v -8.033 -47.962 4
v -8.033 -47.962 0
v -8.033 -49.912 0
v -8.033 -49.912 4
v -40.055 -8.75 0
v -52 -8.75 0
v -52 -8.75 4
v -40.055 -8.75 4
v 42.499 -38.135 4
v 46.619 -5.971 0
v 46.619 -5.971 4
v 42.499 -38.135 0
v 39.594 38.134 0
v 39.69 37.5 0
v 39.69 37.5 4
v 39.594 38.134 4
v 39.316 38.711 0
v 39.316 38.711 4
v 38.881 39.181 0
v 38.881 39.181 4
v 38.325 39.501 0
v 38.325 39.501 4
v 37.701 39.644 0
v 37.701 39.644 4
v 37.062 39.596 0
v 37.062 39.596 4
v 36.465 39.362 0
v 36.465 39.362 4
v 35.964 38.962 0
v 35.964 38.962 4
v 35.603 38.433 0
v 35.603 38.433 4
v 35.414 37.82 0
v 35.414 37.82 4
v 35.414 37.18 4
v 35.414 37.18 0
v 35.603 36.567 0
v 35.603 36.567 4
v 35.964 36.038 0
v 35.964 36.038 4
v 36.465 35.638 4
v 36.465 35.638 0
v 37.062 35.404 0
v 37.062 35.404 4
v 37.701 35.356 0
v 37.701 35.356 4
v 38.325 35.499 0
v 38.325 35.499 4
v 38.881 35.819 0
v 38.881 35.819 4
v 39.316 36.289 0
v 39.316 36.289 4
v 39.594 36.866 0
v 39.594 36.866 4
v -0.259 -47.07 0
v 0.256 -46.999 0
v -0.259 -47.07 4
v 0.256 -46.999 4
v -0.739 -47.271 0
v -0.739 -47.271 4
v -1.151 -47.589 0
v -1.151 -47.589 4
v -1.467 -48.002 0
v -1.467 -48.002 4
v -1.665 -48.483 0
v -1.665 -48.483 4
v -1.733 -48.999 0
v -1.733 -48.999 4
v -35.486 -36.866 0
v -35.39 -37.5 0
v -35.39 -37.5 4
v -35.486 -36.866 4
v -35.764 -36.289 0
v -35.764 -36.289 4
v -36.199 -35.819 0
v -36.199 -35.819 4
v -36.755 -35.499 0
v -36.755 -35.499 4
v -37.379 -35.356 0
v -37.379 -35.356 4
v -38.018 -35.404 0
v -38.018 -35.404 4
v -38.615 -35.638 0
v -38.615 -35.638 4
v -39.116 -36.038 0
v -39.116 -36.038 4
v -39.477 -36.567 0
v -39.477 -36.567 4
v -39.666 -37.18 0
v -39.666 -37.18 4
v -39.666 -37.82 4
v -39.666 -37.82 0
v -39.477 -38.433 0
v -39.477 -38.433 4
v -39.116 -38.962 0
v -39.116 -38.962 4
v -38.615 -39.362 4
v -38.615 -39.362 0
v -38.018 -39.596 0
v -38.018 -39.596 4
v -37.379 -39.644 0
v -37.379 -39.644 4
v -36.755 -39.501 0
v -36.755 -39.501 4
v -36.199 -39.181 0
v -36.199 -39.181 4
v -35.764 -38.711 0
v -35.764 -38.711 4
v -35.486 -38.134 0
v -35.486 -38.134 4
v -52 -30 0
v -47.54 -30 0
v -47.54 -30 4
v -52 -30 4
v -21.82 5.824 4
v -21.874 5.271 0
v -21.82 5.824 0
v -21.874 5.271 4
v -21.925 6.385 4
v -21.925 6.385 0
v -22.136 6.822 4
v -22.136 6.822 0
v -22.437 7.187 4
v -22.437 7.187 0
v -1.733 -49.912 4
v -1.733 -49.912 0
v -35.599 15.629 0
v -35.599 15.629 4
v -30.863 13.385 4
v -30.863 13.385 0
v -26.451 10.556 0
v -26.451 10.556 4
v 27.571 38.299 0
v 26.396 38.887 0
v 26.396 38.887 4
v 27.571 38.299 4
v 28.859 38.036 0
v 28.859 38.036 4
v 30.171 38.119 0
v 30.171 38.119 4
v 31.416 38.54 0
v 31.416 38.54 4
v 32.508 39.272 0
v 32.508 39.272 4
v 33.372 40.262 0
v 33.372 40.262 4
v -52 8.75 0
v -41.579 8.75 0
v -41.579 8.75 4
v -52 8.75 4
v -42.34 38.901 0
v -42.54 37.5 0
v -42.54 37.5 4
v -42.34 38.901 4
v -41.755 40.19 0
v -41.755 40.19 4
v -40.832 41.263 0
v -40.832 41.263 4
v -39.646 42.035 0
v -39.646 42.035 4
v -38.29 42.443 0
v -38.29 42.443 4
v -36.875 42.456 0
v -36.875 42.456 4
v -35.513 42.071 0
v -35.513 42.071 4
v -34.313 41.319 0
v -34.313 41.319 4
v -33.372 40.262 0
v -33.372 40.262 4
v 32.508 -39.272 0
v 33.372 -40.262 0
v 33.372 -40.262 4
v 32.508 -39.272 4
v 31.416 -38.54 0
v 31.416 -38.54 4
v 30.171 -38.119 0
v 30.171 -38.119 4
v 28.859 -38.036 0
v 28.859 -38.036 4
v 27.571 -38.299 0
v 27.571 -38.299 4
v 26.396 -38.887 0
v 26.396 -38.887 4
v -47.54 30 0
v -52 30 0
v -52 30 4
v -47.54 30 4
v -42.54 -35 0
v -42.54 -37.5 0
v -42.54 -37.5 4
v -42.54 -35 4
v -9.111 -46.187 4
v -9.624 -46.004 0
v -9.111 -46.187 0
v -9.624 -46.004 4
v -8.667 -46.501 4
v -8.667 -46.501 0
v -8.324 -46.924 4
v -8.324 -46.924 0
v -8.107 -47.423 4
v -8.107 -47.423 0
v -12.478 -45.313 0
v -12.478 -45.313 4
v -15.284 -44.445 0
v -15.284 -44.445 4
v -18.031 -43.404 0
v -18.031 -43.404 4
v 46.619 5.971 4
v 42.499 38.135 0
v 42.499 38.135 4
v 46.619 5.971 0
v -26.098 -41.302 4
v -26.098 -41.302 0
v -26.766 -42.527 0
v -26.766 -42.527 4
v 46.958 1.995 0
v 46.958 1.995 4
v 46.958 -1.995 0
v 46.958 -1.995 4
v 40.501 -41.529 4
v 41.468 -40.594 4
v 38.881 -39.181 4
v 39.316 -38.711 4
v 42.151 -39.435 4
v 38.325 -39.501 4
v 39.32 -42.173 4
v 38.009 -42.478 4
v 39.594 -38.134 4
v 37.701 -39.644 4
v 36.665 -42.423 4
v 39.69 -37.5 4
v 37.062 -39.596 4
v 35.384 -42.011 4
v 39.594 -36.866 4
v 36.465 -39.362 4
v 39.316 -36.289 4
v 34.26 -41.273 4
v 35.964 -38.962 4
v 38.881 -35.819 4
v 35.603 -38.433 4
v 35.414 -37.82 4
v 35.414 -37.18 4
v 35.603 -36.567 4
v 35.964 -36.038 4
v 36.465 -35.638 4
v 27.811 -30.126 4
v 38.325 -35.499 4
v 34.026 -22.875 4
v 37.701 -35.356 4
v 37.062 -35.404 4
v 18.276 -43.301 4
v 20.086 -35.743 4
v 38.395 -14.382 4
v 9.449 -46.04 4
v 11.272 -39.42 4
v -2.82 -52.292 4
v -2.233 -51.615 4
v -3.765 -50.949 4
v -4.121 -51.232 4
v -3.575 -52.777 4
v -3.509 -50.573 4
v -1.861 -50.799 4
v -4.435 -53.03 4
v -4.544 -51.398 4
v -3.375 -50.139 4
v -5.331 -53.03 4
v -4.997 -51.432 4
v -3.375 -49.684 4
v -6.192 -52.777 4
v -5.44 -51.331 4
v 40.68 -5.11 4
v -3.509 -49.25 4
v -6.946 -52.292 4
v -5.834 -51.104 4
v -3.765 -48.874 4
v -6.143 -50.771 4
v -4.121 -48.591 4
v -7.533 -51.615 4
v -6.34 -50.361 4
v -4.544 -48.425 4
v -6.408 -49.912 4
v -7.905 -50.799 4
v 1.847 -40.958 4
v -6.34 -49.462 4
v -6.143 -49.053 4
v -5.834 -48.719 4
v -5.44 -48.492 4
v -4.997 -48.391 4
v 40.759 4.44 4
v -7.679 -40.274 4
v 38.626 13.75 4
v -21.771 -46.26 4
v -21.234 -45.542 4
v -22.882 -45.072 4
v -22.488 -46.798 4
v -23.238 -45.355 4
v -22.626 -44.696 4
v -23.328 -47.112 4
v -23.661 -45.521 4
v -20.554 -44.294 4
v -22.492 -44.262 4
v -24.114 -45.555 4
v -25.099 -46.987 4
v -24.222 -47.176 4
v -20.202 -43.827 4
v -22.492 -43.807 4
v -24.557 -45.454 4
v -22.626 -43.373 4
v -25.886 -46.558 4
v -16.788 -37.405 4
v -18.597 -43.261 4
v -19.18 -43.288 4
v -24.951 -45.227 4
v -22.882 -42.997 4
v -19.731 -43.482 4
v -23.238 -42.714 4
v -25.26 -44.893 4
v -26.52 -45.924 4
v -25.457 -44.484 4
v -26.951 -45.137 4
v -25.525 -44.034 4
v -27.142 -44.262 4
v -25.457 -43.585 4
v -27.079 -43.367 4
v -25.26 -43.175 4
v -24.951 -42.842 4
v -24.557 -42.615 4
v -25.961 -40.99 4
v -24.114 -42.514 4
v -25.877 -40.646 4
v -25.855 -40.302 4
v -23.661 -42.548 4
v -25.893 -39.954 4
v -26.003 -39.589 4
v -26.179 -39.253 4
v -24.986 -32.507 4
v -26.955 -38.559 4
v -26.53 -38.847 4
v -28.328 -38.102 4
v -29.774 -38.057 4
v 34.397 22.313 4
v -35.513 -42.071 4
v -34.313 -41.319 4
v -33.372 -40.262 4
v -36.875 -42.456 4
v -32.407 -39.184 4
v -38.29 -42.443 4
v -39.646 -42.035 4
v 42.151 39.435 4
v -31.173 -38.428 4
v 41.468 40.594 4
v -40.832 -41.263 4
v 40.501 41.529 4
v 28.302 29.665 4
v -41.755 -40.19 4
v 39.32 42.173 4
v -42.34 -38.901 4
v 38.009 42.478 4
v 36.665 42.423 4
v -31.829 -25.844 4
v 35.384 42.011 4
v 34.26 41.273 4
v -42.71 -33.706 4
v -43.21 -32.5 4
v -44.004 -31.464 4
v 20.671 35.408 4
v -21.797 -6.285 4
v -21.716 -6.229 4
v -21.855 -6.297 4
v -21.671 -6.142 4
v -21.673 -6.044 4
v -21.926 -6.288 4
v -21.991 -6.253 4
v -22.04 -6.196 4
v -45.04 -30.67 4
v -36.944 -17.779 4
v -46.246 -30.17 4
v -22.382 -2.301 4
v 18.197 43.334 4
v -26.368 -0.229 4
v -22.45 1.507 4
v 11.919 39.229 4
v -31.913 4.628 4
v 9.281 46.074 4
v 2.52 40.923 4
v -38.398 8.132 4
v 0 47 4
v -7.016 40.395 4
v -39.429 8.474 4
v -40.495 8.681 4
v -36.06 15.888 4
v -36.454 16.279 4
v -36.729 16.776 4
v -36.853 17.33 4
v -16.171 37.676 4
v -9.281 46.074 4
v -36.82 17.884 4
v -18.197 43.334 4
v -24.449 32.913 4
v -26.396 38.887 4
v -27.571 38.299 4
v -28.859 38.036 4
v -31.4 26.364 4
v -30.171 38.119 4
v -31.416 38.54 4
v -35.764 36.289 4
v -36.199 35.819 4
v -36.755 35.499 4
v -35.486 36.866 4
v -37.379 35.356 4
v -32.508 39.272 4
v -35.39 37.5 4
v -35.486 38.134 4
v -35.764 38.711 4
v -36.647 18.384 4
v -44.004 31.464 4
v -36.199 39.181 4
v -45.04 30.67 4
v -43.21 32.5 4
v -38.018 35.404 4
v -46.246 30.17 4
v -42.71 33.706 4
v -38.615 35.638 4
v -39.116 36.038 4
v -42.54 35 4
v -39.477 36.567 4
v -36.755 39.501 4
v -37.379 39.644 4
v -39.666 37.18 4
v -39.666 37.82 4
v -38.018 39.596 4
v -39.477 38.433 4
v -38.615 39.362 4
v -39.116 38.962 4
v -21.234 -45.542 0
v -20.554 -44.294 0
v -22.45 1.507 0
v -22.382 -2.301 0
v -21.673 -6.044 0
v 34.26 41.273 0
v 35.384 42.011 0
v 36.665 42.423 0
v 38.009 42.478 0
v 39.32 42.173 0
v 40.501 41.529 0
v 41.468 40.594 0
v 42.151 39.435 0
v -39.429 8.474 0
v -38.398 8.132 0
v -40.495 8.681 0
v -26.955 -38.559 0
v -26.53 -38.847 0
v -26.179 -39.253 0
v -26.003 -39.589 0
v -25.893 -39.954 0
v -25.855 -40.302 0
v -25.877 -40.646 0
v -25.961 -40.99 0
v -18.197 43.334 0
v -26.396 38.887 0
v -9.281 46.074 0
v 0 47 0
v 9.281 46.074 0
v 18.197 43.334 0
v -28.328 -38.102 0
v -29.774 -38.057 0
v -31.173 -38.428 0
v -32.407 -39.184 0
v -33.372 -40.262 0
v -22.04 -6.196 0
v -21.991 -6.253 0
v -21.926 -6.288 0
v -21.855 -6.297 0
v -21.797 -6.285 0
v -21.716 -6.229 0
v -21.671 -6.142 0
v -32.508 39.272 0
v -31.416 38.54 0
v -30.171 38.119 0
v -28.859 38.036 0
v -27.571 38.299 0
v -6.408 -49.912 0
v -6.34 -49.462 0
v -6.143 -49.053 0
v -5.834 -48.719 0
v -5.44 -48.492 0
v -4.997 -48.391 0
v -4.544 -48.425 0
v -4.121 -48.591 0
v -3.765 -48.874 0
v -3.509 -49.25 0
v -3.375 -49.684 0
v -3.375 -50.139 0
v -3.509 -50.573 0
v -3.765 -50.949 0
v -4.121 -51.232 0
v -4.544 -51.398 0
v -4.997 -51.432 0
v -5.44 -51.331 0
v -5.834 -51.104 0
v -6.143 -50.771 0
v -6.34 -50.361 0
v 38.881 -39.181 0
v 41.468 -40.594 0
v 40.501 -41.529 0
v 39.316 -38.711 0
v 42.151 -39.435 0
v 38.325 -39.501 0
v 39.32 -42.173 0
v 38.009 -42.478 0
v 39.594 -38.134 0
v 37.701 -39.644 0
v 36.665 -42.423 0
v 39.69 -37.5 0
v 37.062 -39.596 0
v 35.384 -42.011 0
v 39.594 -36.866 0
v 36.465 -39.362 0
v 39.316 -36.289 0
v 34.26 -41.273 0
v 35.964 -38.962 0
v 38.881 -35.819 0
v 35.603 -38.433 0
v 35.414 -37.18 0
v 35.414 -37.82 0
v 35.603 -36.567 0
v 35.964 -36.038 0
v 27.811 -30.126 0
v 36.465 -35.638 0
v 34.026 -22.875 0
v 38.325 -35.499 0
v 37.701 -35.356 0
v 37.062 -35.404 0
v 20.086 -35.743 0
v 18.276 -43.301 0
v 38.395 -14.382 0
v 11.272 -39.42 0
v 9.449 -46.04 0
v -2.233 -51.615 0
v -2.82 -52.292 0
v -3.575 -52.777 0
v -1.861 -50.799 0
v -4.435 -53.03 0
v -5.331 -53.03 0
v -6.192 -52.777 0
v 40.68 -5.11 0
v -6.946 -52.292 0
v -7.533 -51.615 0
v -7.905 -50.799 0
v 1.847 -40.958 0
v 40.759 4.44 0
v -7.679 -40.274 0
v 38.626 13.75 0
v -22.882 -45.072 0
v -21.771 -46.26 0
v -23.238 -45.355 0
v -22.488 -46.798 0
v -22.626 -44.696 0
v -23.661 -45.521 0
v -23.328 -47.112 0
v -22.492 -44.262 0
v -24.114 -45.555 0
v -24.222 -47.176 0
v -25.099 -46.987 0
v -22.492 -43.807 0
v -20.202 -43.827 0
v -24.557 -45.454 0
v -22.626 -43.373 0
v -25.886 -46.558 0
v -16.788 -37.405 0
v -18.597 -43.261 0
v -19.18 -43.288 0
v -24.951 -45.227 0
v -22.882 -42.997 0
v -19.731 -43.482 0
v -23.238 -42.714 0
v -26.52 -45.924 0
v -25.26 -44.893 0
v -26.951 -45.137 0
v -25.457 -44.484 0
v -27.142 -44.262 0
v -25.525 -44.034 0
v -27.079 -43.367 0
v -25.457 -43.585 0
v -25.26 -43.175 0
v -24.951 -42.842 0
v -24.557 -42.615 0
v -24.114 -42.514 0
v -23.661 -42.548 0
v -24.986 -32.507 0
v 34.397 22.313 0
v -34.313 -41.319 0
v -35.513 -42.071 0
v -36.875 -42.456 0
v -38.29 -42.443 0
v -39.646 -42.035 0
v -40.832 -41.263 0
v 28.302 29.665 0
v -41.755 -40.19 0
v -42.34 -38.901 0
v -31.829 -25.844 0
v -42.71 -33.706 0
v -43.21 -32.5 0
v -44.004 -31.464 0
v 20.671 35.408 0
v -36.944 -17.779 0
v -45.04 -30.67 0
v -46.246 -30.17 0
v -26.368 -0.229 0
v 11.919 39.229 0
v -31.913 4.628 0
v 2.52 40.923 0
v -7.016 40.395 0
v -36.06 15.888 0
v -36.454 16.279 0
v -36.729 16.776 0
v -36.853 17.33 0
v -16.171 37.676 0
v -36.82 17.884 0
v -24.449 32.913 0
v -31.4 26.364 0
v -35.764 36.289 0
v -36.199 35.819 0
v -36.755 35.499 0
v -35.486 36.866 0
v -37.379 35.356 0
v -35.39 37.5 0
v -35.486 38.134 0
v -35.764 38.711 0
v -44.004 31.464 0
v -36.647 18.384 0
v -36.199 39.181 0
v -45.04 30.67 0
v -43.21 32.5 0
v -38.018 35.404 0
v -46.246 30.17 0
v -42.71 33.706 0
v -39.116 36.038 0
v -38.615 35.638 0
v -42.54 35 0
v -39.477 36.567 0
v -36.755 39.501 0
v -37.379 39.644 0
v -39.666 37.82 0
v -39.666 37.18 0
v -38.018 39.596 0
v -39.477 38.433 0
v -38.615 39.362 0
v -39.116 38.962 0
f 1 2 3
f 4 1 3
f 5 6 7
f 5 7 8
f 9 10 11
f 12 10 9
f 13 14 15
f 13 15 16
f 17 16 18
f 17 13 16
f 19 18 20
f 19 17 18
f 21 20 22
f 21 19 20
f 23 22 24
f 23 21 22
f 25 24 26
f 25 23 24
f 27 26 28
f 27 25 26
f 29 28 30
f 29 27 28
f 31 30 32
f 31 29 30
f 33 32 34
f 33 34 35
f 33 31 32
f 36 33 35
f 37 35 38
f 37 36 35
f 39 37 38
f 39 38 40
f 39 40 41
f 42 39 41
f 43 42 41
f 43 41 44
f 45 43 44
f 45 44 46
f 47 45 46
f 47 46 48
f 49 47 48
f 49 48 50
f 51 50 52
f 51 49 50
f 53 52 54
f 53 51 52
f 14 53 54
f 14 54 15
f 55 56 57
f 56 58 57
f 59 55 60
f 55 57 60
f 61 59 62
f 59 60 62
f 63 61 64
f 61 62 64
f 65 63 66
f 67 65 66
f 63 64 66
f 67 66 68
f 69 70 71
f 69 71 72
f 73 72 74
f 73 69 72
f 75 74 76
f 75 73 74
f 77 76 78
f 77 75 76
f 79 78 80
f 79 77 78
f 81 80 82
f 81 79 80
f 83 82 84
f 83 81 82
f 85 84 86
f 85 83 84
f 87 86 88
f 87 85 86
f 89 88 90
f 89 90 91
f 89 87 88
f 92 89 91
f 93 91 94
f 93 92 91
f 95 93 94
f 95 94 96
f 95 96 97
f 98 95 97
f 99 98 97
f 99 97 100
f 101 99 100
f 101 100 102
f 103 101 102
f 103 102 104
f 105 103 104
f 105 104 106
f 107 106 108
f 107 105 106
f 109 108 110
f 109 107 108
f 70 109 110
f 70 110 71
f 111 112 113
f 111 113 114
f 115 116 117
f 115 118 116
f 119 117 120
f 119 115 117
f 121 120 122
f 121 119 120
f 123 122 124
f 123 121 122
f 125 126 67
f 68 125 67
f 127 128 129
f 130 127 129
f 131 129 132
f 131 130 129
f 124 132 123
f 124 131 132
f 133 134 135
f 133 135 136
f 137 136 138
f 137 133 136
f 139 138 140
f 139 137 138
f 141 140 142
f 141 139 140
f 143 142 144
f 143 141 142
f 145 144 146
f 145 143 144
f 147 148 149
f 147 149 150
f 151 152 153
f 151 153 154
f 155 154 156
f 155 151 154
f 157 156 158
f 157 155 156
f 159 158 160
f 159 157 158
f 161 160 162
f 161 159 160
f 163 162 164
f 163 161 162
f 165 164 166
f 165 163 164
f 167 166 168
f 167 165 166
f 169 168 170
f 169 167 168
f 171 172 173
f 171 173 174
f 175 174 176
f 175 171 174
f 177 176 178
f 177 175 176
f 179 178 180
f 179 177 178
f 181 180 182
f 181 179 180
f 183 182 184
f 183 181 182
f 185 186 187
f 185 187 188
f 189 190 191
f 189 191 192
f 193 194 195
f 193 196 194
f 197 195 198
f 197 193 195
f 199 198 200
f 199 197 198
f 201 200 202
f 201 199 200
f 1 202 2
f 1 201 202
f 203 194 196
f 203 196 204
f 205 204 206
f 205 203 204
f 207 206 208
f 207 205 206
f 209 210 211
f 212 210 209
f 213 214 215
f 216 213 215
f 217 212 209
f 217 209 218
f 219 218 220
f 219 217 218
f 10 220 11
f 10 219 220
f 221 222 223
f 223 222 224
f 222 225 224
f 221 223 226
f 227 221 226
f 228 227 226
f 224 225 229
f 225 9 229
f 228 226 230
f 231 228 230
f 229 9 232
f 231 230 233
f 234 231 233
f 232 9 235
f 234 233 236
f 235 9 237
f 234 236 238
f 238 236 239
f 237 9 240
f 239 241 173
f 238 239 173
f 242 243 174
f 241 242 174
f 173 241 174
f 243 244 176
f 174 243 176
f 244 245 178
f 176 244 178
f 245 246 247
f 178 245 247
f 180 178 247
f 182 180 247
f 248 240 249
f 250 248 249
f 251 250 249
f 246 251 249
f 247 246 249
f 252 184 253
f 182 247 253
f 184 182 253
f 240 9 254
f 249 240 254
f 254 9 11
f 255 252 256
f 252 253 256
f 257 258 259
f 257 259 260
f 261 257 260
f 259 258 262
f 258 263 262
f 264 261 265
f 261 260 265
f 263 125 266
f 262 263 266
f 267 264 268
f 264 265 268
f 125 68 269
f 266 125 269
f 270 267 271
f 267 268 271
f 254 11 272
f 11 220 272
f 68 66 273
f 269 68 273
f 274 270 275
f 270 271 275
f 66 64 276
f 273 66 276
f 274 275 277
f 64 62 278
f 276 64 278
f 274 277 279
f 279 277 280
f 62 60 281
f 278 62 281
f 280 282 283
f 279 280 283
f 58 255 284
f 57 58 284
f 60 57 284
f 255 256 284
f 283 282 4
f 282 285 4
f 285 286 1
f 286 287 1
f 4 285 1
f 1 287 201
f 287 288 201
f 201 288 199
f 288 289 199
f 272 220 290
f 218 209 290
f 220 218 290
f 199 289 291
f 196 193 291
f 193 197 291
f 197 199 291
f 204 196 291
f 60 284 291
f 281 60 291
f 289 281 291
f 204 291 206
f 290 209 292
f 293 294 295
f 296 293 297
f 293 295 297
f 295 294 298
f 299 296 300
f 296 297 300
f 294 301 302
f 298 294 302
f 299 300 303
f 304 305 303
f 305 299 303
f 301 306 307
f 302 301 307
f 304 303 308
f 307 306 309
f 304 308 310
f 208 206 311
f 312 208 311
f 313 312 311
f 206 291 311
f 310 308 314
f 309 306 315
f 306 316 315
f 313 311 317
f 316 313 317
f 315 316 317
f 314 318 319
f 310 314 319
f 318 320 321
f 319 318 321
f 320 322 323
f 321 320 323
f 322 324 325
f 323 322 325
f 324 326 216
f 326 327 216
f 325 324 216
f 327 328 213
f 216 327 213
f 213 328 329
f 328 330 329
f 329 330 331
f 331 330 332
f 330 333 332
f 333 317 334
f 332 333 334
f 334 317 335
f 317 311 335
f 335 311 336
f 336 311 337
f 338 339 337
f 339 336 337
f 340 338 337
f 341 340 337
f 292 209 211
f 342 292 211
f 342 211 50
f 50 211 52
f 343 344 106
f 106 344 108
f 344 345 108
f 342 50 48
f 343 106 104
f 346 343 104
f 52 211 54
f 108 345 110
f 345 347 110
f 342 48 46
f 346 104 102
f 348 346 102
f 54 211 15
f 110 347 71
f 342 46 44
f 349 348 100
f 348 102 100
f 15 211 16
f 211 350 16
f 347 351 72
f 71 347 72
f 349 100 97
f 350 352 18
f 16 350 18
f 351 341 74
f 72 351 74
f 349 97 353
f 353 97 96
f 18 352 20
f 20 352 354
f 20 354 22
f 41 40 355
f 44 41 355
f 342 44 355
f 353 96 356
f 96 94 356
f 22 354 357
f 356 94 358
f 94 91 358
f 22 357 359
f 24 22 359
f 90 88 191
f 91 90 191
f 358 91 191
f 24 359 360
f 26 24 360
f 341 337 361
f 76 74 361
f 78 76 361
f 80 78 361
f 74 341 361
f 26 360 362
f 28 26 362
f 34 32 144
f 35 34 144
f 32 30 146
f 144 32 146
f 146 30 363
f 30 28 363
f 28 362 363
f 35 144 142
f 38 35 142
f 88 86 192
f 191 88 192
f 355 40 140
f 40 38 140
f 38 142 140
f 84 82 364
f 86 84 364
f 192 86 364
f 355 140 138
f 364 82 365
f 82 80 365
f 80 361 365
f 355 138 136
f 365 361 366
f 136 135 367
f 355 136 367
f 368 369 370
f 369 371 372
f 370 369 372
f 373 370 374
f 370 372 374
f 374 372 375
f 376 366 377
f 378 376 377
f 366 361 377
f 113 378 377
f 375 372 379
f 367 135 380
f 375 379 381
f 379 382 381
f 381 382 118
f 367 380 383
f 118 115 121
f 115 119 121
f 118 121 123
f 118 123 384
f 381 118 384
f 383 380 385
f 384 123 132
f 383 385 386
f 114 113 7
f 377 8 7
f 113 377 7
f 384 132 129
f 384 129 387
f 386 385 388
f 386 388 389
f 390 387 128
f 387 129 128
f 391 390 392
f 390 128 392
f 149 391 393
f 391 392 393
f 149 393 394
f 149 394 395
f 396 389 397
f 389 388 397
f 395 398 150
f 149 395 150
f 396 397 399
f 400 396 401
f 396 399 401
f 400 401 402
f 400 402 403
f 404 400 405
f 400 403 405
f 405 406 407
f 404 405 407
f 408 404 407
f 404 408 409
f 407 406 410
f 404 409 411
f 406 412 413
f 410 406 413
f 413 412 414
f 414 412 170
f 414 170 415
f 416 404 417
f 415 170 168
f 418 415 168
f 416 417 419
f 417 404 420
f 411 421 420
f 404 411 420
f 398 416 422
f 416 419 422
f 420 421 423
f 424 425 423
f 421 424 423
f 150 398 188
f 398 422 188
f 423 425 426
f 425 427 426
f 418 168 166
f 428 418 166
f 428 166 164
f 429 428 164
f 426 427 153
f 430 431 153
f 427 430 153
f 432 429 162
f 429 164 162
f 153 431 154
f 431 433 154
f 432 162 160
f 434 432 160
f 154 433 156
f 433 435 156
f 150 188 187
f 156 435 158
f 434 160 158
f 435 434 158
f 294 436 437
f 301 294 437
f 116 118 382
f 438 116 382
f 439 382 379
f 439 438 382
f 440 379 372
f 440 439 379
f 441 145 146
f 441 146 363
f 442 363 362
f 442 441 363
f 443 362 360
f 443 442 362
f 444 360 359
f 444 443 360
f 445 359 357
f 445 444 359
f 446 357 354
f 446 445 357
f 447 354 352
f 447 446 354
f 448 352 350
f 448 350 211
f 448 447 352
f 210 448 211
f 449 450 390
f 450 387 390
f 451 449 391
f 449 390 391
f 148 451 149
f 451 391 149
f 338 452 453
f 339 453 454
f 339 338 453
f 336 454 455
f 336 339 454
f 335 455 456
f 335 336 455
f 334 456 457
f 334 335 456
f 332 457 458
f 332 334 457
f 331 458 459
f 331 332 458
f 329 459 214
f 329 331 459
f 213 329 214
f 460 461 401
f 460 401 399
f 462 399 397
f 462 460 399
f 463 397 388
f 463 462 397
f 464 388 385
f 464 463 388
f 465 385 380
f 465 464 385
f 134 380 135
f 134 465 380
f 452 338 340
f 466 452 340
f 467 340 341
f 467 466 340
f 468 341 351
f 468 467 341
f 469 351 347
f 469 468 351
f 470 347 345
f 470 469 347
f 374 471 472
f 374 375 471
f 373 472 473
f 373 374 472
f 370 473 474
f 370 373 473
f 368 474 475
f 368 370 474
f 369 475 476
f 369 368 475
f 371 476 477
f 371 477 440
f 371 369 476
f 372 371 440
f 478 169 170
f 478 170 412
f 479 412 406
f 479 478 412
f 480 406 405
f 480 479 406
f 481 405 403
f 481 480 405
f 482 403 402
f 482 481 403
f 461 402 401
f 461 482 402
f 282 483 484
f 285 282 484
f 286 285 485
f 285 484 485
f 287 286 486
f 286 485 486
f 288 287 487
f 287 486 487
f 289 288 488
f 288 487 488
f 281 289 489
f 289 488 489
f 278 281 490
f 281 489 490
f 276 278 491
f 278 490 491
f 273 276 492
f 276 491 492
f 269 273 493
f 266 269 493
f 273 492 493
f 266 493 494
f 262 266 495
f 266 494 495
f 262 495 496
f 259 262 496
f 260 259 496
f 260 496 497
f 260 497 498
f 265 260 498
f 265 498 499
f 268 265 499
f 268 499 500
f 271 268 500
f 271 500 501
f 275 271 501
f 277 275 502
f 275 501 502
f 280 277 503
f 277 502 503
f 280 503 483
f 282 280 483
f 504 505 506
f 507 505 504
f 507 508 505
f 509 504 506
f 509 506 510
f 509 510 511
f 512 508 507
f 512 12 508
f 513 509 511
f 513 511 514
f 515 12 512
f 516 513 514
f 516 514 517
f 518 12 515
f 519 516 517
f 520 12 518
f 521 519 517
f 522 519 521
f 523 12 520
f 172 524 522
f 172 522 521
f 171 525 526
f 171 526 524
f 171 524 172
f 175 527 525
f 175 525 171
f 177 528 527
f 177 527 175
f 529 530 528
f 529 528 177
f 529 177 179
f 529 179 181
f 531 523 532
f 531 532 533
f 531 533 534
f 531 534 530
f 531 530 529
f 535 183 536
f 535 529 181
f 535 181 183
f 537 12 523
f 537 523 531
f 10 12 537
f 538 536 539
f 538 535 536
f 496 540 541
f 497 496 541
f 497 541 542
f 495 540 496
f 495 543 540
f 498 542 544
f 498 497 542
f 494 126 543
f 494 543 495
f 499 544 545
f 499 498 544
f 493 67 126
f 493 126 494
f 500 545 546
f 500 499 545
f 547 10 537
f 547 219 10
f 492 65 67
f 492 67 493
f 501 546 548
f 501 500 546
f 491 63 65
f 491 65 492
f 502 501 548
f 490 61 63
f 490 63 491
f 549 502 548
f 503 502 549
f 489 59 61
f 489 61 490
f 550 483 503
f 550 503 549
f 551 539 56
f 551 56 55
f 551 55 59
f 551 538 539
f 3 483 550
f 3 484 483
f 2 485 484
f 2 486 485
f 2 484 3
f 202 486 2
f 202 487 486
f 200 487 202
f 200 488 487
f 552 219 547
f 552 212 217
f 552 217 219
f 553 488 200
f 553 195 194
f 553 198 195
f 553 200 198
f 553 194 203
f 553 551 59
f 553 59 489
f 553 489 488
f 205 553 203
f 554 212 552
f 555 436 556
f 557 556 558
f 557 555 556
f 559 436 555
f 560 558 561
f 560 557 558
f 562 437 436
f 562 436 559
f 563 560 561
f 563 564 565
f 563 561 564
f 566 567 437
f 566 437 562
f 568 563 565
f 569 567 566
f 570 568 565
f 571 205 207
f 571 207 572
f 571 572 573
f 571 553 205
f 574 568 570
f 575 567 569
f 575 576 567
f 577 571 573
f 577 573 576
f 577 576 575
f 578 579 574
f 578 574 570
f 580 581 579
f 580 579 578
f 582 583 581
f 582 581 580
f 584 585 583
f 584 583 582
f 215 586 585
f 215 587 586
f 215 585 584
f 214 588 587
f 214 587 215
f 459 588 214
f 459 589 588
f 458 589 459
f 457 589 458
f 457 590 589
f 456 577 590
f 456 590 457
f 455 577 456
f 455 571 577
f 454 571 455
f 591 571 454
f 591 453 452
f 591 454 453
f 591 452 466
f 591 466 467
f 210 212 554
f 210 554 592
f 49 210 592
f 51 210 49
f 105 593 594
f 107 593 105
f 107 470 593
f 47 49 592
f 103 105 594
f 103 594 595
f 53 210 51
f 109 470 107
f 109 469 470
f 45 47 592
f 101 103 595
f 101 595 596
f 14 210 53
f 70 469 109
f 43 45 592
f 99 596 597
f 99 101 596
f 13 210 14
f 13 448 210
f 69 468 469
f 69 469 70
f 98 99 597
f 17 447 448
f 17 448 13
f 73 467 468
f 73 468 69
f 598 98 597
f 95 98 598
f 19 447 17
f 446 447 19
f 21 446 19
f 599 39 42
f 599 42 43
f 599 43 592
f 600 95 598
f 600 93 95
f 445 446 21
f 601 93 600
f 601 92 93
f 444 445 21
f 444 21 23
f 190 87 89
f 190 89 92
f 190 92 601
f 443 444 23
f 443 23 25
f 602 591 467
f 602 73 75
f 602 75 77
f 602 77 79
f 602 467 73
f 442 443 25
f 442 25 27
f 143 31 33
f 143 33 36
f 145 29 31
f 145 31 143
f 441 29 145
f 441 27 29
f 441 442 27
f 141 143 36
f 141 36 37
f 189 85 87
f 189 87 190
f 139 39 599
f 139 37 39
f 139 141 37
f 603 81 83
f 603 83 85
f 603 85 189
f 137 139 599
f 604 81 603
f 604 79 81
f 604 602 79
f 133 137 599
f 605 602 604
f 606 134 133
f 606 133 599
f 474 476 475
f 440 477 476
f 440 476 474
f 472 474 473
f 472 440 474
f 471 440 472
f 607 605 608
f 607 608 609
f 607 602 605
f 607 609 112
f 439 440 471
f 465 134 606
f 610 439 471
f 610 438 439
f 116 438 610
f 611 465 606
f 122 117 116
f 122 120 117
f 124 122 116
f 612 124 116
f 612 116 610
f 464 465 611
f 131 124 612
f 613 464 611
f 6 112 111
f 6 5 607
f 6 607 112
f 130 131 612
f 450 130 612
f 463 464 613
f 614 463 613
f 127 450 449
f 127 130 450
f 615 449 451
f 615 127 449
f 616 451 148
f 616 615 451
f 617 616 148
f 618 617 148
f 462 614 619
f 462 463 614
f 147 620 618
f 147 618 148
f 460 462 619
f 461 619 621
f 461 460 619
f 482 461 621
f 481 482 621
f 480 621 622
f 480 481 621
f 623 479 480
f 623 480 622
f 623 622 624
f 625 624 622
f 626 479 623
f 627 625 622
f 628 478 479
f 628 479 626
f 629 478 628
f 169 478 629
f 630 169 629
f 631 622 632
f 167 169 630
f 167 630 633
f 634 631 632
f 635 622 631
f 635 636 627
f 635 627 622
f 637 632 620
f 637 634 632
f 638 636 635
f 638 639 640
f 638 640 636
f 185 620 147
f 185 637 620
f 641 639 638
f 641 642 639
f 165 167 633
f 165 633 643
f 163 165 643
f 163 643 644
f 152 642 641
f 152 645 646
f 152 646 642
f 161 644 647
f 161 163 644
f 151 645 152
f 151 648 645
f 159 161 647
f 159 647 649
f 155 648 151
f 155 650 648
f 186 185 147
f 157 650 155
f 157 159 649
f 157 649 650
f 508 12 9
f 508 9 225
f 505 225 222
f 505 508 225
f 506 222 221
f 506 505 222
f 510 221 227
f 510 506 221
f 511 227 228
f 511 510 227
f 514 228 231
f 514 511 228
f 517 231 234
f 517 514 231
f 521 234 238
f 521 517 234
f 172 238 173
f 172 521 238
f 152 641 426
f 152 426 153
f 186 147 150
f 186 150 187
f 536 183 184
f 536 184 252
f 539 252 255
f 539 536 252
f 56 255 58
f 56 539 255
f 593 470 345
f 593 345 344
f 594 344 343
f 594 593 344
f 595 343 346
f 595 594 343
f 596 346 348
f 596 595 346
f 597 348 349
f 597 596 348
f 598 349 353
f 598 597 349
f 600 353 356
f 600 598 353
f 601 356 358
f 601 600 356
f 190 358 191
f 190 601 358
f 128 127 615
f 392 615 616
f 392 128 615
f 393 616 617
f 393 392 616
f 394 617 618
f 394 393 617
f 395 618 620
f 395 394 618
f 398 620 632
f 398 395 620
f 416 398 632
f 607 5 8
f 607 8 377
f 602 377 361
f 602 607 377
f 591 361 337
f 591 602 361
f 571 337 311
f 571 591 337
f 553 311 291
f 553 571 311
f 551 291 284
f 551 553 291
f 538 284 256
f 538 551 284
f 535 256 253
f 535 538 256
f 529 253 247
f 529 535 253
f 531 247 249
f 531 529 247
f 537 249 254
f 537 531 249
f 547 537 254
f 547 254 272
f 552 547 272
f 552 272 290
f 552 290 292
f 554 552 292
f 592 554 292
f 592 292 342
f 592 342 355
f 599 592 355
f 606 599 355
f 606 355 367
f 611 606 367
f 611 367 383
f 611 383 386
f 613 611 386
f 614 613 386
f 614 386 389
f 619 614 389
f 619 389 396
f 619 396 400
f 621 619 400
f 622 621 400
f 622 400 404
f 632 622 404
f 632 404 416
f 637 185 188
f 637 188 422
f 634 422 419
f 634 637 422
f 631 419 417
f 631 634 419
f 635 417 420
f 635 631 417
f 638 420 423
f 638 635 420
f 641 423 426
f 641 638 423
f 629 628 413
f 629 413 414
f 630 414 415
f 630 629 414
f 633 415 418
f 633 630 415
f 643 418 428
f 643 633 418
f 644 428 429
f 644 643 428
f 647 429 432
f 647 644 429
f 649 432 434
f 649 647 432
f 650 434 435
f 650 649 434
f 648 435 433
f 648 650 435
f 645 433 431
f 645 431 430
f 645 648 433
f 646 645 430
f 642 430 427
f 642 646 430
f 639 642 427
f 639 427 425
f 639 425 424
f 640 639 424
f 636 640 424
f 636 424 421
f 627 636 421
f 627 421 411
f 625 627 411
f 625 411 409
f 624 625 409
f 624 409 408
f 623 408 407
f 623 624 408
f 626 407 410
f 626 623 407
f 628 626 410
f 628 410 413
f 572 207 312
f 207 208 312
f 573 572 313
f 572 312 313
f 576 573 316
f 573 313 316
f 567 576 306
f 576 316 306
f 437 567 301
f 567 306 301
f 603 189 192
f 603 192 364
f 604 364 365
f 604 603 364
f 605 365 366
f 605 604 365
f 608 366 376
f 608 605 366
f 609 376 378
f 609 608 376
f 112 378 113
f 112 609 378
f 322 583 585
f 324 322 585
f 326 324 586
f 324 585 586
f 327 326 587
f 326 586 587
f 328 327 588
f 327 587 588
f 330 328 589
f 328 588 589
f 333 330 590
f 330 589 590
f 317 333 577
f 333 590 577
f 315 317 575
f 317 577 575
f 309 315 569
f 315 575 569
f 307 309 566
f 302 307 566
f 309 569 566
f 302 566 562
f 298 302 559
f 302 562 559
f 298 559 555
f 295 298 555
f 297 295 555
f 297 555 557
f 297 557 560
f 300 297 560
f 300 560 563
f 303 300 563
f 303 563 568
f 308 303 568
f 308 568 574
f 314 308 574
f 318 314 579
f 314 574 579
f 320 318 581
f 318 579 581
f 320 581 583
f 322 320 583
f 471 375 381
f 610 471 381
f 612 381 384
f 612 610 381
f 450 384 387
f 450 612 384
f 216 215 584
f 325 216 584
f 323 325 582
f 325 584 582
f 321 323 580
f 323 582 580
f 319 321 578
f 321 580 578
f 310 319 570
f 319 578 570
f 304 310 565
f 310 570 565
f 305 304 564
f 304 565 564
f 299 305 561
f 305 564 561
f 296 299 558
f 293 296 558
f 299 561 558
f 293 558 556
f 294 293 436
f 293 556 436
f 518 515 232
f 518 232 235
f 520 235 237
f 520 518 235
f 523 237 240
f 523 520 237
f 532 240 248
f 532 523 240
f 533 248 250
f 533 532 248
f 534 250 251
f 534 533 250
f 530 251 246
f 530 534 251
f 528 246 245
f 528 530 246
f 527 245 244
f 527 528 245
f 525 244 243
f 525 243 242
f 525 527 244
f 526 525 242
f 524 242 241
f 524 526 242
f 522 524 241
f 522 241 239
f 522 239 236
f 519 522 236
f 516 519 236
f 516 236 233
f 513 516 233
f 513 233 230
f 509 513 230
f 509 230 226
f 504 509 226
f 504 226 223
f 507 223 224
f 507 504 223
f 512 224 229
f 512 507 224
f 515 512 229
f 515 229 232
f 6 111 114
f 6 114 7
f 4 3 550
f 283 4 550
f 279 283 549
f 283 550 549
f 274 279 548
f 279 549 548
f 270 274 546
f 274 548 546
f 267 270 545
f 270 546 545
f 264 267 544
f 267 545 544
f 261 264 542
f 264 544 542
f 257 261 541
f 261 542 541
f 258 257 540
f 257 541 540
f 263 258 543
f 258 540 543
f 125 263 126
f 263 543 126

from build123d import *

# Parameters (mm, degrees)
SKETCH_1_R      = 2.15
EXTRUDE_1_DEPTH = 4
FILLET_1_R      = 0.2
FILLET_2_R      = 2
FILLET_3_R      = 2
FILLET_4_R      = 8.5
SKETCH_2_R      = 1.525
EXTRUDE_2_DEPTH = 4
FILLET_5_R      = 2


with BuildPart() as part:
    # 草图1 → 凸台-拉伸1 (new body)
    with BuildSketch(Plane.XY):
        with BuildLine():
            Line((-52, 8.75), (-52, 30))
            Line((-52, 30), (-47.54, 30))
            ThreePointArc((-47.54, 30), (-44.004466094, 31.464466094), (-42.54, 35))
            Line((-42.54, 35), (-42.54, 37.5))
            ThreePointArc((-42.54, 37.5), (-38.982425028, 42.287422066), (-33.372235985, 40.262198963))
            ThreePointArc((-33.372235985, 40.262198963), (-30.171244586, 38.118753147), (-26.396349665, 38.887436588))
            ThreePointArc((-26.396349665, 38.887436588), (0, 47), (26.396349665, 38.887436588))
            ThreePointArc((26.396349665, 38.887436588), (30.171244586, 38.118753147), (33.372235985, 40.262198963))
            ThreePointArc((33.372235985, 40.262198963), (38.674773042, 42.369526686), (42.499484755, 38.135225128))
            Line((42.499484755, 38.135225128), (46.619156699, 5.971116201))
            ThreePointArc((46.619156699, 5.971116201), (47, 0), (46.619156699, -5.971116201))
            Line((46.619156699, -5.971116201), (42.499484755, -38.135225128))
            ThreePointArc((42.499484755, -38.135225128), (38.674773042, -42.369526686), (33.372235985, -40.262198963))
            ThreePointArc((33.372235985, -40.262198963), (30.171244586, -38.118753147), (26.396349665, -38.887436588))
            ThreePointArc((26.396349665, -38.887436588), (0, -47), (-26.396349665, -38.887436588))
            ThreePointArc((-26.396349665, -38.887436588), (-30.171244586, -38.118753147), (-33.372235985, -40.262198963))
            ThreePointArc((-33.372235985, -40.262198963), (-38.982425028, -42.287422066), (-42.54, -37.5))
            Line((-42.54, -37.5), (-42.54, -35))
            ThreePointArc((-42.54, -35), (-44.004466094, -31.464466094), (-47.54, -30))
            Line((-47.54, -30), (-52, -30))
            Line((-52, -30), (-52, -8.75))
            Line((-52, -8.75), (-40.055430343, -8.75))
            ThreePointArc((-40.055430343, -8.75), (40.804364959, -4.000475011), (-37.593370285, 16.362717092))
            ThreePointArc((-37.593370285, 16.362717092), (-29.005163231, 12.290176631), (-21.585495377, 6.349518825))
            ThreePointArc((-21.585495377, 6.349518825), (-22.451945258, -1.469746278), (-20.573530425, -9.10932741))
            ThreePointArc((-20.573530425, -9.10932741), (-28.44850534, 1.855840669), (-40.055430343, 8.75))
            Line((-40.055430343, 8.75), (-52, 8.75))
        make_face()
        with Locations((-37.54, 37.5)):
            Circle(SKETCH_1_R, mode=Mode.SUBTRACT)
        with Locations((-37.54, -37.5)):
            Circle(SKETCH_1_R, mode=Mode.SUBTRACT)
        with Locations((37.54, -37.5)):
            Circle(SKETCH_1_R, mode=Mode.SUBTRACT)
        with Locations((37.54, 37.5)):
            Circle(SKETCH_1_R, mode=Mode.SUBTRACT)
    extrude(amount=EXTRUDE_1_DEPTH)

    # 圆角1
    fillet_1_edges = [part.edges().sort_by_distance(p)[0] for p in [
        (-20.573530425, -9.10932741, 2),
    ]]
    fillet(fillet_1_edges, radius=FILLET_1_R)

    # 圆角2
    fillet_2_edges = [part.edges().sort_by_distance(p)[0] for p in [
        (-21.585495377, 6.349518825, 2),
    ]]
    fillet(fillet_2_edges, radius=FILLET_2_R)

    # 圆角3
    fillet_3_edges = [part.edges().sort_by_distance(p)[0] for p in [
        (-37.593370285, 16.362717092, 2),
    ]]
    fillet(fillet_3_edges, radius=FILLET_3_R)

    # 圆角4
    fillet_4_edges = [part.edges().sort_by_distance(p)[0] for p in [
        (-40.055430343, 8.75, 2),
    ]]
    fillet(fillet_4_edges, radius=FILLET_4_R)

    # 草图2 → 凸台-拉伸2 (add)
    # profile 1 of 2: a face of its own
    with BuildSketch(Plane(origin=(0, 0, 0), x_dir=(-1, 0, 0), z_dir=(0, 0, -1))):
        with BuildLine():
            Line((1.733082495, -49.911702088), (1.733082495, -46.968036206))
            ThreePointArc((1.733082495, -46.968036206), (4.894207665, -46.744483432), (8.033082495, -46.308418086))
            Line((8.033082495, -46.308418086), (8.033082495, -49.911702088))
            ThreePointArc((8.033082495, -49.911702088), (4.883082495, -53.061702088), (1.733082495, -49.911702088))
        make_face()
        with Locations((4.883082495, -49.911702088)):
            Circle(SKETCH_2_R, mode=Mode.SUBTRACT)
    # profile 2 of 2: a face of its own
    with BuildSketch(Plane(origin=(0, 0, 0), x_dir=(-1, 0, 0), z_dir=(0, 0, -1))):
        with BuildLine():
            Line((21.234134605, -45.541810763), (19.676083646, -42.683155136))
            ThreePointArc((19.676083646, -42.683155136), (22.492522433, -41.268467801), (25.207814436, -39.668200001))
            Line((25.207814436, -39.668200001), (26.765865395, -42.526855629))
            ThreePointArc((26.765865395, -42.526855629), (25.507477567, -46.800198591), (21.234134605, -45.541810763))
        make_face()
        with Locations((24, -44.034333196)):
            Circle(SKETCH_2_R, mode=Mode.SUBTRACT)
    extrude(amount=-EXTRUDE_2_DEPTH)

    # 圆角5
    fillet_5_edges = [part.edges().sort_by_distance(p)[0] for p in [
        (-1.733082495, -46.968036206, 2),
        (-19.676083646, -42.683155136, 2),
        (-25.207814436, -39.668200001, 2),
        (-8.033082495, -46.308418086, 2),
    ]]
    fillet(fillet_5_edges, radius=FILLET_5_R)


solid = part.part
